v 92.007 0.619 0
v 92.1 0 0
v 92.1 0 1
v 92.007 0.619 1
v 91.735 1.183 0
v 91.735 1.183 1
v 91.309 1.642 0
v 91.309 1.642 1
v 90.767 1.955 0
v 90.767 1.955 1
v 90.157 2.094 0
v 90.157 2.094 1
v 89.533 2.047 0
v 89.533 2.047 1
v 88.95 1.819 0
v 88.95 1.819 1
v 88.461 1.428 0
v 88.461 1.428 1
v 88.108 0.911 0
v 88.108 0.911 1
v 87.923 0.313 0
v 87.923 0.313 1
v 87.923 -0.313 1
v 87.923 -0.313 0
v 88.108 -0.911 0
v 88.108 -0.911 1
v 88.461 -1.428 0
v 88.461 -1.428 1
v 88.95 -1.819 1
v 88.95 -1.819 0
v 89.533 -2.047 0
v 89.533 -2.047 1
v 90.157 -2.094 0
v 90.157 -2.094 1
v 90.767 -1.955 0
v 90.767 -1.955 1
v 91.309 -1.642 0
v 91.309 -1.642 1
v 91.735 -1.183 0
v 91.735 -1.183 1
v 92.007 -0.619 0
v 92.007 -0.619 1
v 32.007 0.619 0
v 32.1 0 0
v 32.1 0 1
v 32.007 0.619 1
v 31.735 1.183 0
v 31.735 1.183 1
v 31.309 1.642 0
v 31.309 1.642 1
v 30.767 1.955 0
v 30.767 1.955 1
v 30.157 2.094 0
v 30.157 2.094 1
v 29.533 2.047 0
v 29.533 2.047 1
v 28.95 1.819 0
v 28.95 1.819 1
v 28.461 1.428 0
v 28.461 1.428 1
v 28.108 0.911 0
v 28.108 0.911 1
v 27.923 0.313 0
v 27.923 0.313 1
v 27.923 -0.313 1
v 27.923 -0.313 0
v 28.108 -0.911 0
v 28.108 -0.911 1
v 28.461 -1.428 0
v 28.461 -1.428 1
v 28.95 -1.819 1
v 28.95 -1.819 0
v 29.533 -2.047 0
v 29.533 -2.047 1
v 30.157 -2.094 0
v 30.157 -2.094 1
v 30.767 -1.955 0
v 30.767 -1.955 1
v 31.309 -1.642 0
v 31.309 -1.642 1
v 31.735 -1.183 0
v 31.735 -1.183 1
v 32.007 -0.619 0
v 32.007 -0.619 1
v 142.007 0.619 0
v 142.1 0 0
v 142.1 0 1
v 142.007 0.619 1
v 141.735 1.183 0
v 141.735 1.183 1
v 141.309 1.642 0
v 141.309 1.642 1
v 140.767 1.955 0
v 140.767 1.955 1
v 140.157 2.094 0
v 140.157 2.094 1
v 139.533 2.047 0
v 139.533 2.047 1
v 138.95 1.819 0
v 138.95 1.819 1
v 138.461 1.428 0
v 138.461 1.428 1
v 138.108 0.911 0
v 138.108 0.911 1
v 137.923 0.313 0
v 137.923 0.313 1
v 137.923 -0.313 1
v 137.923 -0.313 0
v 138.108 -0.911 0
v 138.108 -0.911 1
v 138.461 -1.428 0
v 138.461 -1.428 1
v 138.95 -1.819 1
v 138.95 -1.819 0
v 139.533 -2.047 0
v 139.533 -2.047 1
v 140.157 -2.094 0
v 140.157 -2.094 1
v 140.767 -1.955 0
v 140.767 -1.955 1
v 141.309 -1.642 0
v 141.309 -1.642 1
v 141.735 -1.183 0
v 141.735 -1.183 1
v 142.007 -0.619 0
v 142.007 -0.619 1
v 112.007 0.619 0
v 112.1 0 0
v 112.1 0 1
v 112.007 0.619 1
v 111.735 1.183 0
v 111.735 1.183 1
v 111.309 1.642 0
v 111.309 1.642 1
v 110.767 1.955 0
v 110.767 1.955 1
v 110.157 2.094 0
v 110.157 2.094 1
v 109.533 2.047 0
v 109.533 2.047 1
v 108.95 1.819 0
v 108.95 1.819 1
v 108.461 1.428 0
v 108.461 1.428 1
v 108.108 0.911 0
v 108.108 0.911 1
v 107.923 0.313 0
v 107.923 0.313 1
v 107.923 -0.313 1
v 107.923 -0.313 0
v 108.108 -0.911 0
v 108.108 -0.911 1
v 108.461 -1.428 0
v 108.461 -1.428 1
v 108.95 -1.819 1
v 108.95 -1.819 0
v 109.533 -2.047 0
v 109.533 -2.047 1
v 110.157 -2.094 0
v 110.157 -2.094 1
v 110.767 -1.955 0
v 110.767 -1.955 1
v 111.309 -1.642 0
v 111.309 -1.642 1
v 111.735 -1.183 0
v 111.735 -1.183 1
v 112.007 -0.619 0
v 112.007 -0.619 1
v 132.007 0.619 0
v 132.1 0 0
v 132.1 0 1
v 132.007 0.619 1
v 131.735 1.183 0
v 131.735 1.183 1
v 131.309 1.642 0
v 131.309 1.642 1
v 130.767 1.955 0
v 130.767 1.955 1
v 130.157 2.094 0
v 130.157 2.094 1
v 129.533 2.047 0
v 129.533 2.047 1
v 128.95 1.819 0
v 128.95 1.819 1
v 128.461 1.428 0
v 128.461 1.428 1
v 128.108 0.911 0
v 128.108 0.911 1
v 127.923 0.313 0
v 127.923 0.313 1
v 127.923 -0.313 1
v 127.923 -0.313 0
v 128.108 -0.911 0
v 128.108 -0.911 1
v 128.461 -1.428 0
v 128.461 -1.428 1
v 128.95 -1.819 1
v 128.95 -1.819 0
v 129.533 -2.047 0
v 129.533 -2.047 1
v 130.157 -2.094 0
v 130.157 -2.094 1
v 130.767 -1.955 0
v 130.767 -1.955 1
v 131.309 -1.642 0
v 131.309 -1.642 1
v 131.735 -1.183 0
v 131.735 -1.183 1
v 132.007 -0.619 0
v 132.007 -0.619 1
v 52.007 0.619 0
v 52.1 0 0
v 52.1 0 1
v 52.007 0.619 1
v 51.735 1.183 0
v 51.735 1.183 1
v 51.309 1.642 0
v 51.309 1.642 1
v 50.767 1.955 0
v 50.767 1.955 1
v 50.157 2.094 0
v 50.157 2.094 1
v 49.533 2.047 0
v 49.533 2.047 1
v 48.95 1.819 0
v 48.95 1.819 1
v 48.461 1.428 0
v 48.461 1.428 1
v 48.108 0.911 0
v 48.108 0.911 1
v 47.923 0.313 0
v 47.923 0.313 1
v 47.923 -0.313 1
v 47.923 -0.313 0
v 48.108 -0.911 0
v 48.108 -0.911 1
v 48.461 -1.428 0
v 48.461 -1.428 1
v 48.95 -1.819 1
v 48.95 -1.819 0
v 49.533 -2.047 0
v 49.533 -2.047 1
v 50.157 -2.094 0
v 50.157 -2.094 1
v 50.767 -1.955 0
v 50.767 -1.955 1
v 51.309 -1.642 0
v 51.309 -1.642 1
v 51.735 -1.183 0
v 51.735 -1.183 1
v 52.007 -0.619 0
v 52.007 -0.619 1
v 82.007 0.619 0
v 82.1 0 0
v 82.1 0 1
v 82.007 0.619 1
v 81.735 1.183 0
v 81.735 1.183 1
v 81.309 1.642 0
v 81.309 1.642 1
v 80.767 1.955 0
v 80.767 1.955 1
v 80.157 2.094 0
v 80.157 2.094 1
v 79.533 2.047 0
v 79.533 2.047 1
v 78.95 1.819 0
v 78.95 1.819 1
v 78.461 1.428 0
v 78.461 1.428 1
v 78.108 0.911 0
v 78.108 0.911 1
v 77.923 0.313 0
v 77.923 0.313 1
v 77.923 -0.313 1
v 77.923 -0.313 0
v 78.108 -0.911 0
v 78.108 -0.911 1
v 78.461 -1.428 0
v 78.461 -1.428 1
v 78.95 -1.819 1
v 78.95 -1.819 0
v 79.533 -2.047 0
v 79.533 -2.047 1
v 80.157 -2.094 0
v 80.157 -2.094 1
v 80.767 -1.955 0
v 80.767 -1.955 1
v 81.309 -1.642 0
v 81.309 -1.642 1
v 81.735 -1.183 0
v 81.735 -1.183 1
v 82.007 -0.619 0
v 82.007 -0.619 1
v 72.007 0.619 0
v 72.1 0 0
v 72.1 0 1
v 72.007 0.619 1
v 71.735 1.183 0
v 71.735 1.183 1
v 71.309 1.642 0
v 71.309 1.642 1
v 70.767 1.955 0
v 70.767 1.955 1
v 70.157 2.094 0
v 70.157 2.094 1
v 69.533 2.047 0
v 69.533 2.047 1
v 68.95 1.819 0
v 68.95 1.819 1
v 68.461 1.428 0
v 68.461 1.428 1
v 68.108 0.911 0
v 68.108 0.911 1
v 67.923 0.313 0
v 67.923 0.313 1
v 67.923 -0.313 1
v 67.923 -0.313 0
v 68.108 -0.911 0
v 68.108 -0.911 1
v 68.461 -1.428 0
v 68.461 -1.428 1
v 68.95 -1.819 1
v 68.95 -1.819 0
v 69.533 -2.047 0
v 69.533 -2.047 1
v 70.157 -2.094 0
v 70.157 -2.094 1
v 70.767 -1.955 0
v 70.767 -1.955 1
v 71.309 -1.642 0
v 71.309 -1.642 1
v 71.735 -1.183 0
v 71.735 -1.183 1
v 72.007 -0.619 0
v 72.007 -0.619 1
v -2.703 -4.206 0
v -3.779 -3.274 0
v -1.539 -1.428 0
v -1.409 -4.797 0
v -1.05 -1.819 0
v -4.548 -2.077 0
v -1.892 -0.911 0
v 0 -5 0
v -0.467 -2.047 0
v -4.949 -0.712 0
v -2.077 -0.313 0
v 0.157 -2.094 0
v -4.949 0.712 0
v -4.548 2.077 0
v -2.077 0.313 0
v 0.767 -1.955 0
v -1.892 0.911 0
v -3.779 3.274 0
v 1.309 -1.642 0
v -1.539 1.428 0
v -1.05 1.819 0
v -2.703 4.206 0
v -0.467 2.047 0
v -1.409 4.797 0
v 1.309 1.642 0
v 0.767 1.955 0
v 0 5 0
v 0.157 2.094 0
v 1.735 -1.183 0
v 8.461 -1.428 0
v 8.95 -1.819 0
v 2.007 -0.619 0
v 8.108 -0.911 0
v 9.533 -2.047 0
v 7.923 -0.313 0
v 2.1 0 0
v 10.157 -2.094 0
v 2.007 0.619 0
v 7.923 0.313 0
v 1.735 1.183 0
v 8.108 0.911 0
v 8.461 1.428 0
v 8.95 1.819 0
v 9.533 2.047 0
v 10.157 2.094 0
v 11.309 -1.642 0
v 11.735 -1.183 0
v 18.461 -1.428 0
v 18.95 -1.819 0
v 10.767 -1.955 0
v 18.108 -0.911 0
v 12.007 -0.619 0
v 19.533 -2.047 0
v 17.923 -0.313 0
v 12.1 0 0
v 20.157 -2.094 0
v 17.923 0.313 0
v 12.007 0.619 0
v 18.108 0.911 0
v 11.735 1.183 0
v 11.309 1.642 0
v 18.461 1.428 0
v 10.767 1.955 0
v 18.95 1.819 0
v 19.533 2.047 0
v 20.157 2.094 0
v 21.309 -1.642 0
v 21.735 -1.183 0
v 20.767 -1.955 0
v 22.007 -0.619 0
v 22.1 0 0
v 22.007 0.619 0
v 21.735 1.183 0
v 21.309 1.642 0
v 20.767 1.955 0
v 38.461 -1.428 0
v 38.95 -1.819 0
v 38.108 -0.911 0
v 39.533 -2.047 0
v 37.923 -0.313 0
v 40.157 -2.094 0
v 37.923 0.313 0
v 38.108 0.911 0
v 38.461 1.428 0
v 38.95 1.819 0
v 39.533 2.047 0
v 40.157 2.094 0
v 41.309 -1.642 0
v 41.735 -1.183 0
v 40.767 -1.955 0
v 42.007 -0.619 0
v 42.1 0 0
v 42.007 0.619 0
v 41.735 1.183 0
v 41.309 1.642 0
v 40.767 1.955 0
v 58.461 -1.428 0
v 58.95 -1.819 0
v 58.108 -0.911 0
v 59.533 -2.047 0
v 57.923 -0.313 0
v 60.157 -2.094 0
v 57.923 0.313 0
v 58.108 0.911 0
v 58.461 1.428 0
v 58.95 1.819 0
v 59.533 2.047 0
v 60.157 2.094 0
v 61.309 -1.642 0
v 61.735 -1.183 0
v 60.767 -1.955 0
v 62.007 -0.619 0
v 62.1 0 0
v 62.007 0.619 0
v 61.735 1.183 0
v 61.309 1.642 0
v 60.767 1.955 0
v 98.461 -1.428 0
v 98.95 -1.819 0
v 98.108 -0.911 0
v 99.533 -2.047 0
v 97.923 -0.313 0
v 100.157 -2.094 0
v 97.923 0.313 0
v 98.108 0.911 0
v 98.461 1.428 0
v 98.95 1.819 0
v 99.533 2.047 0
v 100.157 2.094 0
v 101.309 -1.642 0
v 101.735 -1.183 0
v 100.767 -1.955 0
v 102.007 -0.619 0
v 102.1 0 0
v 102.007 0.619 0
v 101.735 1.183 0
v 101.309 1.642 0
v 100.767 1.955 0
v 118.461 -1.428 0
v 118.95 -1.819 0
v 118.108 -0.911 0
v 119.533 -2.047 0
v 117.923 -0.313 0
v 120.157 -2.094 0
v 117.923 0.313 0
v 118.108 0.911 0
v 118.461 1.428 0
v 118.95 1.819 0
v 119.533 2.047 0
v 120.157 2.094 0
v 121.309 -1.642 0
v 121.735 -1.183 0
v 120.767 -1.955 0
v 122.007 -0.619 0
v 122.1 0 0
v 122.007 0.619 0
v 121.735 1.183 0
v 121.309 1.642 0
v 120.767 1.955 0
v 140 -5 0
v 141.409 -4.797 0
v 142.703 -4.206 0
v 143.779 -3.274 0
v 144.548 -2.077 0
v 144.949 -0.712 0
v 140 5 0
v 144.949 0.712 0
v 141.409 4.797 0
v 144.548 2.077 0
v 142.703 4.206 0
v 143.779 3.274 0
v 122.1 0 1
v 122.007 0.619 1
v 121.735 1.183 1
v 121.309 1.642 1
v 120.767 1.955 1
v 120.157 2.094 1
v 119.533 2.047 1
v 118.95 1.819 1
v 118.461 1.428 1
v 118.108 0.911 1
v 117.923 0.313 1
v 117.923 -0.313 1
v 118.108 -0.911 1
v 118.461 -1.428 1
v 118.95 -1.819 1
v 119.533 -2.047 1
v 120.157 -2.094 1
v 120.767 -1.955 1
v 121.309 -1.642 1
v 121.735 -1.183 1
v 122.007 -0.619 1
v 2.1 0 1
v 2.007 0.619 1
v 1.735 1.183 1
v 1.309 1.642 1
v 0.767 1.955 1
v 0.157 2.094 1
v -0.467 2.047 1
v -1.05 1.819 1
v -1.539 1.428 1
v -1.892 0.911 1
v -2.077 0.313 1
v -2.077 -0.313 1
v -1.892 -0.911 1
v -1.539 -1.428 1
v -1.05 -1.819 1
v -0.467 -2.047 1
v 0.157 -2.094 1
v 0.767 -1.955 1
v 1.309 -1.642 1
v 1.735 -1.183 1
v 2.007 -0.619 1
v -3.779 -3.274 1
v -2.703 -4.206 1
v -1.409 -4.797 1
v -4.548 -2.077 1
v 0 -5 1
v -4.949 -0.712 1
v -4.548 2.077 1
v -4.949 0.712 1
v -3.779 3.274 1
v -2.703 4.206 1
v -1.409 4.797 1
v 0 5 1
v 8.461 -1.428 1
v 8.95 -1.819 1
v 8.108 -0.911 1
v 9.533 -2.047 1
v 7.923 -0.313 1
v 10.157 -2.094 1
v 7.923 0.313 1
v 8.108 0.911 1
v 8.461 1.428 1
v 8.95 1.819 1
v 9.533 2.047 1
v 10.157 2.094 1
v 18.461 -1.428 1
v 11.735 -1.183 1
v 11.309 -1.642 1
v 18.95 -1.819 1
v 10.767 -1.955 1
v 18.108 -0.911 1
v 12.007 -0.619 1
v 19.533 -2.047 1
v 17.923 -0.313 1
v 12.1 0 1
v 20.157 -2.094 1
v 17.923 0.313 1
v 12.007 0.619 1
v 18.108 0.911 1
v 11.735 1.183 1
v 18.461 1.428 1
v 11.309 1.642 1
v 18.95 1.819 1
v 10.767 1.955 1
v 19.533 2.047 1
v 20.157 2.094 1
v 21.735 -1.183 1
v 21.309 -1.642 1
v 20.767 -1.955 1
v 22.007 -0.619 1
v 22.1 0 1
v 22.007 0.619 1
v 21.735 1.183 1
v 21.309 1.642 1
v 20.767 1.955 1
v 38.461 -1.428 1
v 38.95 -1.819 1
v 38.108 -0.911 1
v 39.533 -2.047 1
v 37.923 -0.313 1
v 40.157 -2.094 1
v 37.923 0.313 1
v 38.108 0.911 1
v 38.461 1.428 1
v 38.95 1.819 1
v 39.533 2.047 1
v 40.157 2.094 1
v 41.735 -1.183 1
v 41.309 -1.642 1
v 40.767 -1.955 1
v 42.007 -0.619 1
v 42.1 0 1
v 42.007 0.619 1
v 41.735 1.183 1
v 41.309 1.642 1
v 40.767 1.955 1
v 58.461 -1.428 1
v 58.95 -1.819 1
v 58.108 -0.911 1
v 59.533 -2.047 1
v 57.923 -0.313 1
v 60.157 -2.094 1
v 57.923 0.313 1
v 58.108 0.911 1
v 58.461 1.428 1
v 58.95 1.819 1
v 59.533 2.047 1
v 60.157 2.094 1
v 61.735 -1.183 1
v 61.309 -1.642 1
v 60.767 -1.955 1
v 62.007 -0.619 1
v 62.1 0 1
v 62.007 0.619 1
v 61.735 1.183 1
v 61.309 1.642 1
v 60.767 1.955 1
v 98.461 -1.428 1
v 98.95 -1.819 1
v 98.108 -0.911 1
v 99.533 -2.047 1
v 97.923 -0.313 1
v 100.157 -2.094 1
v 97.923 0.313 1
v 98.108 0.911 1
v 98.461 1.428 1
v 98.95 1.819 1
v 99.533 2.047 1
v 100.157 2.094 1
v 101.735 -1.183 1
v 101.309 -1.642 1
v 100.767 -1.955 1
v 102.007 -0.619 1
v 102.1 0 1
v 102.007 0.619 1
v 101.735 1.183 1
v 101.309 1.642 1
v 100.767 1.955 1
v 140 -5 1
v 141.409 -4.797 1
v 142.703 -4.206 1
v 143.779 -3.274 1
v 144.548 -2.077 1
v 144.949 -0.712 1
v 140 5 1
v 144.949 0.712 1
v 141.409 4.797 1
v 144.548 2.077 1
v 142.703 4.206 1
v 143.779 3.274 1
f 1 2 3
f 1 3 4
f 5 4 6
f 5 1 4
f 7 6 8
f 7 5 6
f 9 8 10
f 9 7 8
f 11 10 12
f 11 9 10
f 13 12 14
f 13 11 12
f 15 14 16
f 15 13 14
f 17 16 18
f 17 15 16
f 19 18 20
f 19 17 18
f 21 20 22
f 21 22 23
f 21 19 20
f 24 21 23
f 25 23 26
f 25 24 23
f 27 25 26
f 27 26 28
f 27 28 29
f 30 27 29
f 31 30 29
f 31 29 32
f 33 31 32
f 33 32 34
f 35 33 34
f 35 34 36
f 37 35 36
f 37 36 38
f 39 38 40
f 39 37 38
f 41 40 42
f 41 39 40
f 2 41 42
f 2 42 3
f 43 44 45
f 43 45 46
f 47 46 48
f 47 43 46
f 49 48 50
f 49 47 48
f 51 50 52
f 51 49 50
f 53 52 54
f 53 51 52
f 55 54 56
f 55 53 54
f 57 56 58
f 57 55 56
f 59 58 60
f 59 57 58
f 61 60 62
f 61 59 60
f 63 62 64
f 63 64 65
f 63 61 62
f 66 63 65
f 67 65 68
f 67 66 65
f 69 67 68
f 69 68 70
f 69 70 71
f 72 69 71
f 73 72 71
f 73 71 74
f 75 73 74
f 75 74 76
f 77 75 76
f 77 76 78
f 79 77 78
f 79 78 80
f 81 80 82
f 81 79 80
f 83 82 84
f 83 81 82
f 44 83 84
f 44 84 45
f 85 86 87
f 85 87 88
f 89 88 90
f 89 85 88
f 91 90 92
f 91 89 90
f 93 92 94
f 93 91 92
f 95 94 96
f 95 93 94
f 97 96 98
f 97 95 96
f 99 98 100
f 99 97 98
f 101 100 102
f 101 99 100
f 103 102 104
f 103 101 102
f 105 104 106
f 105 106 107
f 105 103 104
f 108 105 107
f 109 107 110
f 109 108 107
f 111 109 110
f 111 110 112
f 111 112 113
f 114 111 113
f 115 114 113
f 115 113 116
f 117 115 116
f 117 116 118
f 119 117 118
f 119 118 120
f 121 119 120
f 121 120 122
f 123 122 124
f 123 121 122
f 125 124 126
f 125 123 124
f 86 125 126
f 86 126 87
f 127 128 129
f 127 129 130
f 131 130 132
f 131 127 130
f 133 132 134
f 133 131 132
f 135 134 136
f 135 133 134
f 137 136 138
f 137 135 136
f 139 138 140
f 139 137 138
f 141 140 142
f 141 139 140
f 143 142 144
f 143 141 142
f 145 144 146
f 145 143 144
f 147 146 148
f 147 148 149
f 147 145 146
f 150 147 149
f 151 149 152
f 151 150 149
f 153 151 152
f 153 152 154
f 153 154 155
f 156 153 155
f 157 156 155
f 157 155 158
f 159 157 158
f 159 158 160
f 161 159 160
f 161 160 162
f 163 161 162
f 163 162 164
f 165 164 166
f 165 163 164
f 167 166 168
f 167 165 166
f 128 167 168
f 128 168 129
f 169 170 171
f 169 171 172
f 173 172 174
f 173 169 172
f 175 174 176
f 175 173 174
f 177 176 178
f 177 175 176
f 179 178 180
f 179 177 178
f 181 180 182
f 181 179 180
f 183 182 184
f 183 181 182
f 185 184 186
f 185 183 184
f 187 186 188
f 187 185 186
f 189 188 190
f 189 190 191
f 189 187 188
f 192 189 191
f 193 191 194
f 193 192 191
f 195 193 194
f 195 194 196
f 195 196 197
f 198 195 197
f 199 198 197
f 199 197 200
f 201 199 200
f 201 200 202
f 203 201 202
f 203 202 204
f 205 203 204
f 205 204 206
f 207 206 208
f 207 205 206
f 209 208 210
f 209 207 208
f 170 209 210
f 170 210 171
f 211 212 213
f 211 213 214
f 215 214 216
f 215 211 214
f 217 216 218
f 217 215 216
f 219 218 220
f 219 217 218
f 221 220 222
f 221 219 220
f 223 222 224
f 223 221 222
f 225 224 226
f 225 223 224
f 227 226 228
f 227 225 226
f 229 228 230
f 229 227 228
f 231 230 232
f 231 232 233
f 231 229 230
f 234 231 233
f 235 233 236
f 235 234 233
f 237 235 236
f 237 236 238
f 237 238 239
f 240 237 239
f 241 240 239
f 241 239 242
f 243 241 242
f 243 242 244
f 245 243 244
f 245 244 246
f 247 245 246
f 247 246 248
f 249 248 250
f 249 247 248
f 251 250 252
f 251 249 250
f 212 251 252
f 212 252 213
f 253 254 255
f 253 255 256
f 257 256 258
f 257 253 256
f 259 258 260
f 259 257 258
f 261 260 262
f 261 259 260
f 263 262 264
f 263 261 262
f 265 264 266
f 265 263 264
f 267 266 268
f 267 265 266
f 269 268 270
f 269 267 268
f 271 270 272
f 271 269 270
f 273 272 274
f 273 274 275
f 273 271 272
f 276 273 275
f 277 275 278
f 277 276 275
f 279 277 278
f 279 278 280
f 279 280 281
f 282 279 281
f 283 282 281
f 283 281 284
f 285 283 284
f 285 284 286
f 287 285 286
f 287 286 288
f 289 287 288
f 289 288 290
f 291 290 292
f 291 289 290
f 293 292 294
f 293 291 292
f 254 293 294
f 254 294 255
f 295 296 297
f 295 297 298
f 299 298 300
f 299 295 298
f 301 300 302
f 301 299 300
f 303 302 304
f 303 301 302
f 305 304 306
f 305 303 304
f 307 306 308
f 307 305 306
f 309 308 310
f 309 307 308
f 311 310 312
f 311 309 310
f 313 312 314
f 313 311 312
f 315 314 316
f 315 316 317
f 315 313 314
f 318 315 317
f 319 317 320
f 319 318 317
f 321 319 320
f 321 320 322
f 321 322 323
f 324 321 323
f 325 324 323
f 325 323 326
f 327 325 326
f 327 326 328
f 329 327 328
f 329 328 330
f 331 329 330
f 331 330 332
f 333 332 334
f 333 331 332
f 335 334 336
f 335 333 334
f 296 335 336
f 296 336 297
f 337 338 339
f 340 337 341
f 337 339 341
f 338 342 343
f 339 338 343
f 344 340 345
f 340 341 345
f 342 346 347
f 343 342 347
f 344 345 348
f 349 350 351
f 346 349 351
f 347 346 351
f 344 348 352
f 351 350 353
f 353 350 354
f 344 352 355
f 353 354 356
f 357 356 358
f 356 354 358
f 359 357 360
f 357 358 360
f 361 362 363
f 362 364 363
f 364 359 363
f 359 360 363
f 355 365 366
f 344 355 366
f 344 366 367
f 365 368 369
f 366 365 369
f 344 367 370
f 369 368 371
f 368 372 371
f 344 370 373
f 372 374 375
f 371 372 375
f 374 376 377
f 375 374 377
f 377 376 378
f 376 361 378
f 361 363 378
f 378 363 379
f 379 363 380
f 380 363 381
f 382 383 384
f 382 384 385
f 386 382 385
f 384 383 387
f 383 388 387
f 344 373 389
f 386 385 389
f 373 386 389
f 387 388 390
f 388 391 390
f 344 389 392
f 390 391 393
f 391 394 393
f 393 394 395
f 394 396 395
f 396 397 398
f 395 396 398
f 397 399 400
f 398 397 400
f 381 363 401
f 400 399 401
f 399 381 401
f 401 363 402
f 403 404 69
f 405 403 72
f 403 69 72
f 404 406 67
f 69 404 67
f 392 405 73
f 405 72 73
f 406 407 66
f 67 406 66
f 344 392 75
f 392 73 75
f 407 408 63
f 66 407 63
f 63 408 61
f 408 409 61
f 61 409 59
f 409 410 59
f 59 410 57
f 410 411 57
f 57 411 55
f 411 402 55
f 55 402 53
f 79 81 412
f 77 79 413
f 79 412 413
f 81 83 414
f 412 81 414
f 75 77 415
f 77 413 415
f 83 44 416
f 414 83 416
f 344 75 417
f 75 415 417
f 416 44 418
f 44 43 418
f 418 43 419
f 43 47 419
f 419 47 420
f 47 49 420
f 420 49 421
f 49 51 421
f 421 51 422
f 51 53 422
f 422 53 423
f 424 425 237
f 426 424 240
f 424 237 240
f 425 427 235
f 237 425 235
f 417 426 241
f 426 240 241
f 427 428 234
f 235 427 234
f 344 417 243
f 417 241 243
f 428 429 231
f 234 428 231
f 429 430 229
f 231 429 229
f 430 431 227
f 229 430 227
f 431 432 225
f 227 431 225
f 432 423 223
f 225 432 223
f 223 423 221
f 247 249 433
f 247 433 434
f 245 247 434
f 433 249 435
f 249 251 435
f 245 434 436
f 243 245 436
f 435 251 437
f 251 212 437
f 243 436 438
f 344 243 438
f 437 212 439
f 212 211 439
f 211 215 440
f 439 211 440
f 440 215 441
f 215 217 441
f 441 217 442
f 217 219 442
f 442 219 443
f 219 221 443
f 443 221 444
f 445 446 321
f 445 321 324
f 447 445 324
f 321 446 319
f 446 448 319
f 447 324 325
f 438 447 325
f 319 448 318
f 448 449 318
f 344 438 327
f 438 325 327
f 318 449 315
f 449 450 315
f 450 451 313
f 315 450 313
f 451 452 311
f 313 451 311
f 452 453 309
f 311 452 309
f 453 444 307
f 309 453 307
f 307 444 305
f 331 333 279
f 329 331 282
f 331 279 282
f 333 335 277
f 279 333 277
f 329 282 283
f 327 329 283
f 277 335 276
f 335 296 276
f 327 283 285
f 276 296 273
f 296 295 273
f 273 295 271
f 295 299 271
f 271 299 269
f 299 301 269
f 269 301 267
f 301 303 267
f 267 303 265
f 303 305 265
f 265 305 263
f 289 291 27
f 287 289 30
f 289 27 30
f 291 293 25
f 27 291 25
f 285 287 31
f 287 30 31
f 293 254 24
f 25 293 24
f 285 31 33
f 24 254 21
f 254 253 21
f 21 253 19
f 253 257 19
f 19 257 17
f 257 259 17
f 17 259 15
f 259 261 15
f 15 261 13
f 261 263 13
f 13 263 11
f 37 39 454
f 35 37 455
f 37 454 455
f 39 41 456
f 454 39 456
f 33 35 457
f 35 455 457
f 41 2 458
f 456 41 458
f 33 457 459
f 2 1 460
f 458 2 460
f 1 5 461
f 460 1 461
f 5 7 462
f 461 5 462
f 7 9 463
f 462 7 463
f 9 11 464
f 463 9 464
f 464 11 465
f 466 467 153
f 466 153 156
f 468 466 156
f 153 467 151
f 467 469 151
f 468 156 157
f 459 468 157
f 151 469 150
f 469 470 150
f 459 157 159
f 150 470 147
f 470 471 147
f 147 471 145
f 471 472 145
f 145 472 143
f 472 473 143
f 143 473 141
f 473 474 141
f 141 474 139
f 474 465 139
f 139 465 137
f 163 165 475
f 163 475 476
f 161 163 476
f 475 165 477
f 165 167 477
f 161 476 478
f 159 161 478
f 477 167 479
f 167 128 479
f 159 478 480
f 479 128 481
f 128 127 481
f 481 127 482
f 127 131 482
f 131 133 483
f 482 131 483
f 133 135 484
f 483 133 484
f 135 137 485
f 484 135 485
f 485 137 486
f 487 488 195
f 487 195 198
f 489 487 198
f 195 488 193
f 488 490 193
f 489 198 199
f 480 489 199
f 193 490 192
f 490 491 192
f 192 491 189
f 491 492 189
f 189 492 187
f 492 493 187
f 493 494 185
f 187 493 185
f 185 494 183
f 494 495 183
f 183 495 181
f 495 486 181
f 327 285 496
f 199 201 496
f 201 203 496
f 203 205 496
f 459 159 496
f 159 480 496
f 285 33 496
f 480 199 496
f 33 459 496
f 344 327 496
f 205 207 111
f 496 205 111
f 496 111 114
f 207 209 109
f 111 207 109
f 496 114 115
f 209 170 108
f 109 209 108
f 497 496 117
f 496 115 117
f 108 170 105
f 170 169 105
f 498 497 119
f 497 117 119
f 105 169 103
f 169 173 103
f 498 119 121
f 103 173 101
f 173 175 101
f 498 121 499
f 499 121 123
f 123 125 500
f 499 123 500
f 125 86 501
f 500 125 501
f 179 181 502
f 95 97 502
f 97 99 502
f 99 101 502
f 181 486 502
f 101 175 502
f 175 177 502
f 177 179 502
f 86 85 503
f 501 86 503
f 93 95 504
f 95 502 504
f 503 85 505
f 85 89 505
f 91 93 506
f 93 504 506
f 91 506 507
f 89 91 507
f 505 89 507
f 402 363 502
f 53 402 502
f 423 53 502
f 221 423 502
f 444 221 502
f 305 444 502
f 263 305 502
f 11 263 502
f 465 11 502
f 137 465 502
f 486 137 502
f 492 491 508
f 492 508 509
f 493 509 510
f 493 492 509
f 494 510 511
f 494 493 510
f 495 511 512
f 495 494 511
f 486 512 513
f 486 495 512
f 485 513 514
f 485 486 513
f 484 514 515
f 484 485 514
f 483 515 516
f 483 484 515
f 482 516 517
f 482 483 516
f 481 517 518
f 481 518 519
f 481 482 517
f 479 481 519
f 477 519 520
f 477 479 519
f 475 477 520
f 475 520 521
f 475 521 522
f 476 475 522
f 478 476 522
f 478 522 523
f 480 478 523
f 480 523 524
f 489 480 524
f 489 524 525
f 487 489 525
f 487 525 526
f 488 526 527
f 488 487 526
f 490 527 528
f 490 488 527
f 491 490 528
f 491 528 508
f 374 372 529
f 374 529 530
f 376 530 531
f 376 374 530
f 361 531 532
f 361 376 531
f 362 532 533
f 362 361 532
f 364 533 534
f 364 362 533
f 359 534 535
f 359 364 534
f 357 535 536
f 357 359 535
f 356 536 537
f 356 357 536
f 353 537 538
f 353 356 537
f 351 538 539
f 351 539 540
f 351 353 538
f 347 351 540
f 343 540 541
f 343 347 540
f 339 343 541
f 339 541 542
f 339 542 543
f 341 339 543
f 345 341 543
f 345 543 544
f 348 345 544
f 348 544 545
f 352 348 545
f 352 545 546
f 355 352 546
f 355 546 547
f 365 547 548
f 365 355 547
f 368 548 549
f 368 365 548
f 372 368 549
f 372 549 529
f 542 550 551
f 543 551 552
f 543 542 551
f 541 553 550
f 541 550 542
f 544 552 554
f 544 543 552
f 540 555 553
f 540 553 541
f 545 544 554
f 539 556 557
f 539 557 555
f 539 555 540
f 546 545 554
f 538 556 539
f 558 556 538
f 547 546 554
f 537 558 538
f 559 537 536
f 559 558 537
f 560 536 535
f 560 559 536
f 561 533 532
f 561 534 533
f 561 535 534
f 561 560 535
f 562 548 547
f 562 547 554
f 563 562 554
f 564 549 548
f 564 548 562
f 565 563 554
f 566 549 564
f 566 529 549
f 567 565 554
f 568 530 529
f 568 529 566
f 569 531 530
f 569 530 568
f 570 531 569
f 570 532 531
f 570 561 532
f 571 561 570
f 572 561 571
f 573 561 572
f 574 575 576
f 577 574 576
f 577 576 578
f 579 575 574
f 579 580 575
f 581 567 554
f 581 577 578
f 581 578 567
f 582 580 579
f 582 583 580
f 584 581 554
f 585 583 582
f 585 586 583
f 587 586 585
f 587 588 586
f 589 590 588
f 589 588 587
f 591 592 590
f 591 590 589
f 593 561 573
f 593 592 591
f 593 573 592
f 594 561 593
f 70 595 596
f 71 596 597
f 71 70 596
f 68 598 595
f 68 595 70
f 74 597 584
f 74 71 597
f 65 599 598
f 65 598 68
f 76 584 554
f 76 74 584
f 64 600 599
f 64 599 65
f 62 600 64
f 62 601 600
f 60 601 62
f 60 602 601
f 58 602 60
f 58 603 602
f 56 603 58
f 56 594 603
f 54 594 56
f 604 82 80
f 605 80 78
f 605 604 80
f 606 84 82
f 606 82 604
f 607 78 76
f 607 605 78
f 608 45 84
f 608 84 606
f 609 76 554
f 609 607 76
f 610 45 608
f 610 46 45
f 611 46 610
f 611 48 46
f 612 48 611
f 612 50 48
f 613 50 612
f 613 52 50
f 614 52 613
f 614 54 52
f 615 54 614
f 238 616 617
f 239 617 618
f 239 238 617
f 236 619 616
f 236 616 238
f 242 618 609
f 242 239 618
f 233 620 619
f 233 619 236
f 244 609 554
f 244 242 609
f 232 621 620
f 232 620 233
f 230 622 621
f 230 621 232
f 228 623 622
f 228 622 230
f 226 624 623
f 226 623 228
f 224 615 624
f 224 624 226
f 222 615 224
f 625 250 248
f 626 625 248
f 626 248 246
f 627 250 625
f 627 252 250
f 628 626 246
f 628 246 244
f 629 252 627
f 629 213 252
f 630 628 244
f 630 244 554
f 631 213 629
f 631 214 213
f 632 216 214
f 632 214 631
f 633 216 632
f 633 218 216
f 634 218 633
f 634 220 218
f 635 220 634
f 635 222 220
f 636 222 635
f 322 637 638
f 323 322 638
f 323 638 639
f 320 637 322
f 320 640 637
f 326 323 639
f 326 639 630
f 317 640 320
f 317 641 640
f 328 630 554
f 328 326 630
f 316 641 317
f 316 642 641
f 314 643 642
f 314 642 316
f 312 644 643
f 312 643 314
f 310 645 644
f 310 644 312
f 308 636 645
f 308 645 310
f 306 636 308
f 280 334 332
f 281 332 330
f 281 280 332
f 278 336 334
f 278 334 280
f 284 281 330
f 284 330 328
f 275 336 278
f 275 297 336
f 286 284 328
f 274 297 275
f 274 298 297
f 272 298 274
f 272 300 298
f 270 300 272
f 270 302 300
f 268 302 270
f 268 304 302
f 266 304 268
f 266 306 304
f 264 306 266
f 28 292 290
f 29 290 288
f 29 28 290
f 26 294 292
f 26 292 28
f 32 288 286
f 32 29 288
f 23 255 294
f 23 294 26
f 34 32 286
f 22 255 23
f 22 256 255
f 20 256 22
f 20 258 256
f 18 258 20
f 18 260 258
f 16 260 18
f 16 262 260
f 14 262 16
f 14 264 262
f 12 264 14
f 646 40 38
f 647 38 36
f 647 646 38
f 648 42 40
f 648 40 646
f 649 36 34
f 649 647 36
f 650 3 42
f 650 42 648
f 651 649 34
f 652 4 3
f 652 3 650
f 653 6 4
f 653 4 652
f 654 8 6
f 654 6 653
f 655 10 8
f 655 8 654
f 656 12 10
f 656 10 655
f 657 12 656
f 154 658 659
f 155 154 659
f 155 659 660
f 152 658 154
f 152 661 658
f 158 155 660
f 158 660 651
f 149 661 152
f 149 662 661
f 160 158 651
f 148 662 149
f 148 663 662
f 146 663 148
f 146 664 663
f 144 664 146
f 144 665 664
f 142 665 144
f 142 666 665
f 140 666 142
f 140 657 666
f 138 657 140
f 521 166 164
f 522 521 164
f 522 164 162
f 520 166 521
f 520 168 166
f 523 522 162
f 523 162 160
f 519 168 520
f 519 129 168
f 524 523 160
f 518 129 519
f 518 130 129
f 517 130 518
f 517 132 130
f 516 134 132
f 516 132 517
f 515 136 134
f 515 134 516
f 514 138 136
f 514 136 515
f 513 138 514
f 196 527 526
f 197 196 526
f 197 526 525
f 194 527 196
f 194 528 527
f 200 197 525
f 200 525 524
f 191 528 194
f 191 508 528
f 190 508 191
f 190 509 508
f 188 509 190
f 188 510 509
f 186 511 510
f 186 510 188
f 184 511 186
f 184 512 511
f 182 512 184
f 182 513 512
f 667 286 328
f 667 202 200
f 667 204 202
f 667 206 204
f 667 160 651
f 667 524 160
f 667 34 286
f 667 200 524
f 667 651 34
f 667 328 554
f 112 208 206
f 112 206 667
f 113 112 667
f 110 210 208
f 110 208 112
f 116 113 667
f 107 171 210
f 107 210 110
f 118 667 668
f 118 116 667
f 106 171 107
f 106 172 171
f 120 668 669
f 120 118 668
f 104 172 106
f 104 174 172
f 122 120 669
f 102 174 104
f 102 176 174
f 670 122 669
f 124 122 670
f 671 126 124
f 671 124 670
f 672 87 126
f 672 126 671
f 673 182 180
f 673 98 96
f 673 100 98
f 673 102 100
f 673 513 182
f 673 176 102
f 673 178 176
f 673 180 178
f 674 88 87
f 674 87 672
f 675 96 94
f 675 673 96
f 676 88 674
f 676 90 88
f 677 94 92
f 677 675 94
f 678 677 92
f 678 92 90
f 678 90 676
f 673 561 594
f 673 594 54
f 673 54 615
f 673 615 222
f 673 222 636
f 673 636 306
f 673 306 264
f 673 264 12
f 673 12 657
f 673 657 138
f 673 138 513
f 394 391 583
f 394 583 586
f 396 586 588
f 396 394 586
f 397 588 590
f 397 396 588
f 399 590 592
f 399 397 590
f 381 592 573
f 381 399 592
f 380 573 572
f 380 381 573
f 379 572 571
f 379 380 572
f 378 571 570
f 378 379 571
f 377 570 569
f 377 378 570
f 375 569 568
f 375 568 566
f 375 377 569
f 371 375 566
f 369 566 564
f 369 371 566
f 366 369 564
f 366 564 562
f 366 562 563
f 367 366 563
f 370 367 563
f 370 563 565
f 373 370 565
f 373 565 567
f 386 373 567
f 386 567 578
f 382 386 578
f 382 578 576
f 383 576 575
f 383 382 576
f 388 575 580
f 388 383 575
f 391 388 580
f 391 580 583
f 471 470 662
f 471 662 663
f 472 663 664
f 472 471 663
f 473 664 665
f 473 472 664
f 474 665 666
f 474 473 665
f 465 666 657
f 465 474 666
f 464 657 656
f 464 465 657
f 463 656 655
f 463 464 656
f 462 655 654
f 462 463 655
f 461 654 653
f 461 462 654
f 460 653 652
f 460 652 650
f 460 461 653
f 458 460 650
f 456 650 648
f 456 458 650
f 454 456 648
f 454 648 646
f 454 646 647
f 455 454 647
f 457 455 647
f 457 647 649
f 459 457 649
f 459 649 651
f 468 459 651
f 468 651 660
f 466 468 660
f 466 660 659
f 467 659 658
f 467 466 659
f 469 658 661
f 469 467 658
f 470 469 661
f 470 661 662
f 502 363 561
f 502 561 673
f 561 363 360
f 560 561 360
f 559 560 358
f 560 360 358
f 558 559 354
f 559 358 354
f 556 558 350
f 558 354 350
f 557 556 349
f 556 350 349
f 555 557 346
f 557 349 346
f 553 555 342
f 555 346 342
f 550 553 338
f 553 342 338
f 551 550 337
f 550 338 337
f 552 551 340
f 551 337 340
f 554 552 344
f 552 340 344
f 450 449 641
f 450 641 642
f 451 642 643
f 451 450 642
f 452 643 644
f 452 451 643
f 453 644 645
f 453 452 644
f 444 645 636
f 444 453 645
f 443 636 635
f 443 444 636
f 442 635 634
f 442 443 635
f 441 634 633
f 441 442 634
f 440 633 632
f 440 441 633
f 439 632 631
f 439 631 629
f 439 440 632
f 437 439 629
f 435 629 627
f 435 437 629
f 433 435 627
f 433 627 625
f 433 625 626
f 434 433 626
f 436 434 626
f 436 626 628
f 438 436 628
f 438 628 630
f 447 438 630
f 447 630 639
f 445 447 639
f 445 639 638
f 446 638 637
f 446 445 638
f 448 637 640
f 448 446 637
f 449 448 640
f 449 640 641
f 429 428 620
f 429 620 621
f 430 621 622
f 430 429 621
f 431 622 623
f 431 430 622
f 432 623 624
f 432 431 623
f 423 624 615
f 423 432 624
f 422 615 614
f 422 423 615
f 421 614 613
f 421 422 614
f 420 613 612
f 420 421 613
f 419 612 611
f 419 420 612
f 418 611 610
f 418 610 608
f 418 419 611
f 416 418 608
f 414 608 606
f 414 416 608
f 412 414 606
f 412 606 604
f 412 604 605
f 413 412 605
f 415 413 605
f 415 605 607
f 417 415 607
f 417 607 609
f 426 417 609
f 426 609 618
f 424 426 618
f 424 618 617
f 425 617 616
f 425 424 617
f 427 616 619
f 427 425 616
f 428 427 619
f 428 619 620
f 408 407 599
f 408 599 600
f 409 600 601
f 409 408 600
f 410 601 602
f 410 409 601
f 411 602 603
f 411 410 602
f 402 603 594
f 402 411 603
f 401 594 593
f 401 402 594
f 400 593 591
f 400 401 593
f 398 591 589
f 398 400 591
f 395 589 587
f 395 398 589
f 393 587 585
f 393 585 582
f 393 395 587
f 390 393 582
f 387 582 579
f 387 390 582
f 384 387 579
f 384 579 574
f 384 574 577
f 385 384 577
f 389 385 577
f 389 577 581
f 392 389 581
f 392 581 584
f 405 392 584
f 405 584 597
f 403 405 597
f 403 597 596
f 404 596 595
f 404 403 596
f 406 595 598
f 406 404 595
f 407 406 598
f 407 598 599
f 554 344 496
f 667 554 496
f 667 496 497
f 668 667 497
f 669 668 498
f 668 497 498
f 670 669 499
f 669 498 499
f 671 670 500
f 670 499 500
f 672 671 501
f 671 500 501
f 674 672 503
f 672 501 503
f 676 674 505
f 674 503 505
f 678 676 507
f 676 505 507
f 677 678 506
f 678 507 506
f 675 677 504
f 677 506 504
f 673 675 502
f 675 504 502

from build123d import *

# Parameters (mm, degrees)
SKETCH_R  = 2.1
PAD_DEPTH = 1


with BuildPart() as part:
    # Sketch → Pad (new body)
    with BuildSketch(Plane.XY):
        with BuildLine():
            ThreePointArc((0, 5), (-5, 0), (0, -5))
            Line((0, -5), (140, -5))
            ThreePointArc((140, -5), (145, 0), (140, 5))
            Line((0, 5), (140, 5))
        make_face()
        Circle(SKETCH_R, mode=Mode.SUBTRACT)
        with Locations((10, 0)):
            Circle(SKETCH_R, mode=Mode.SUBTRACT)
        with Locations((20, 0)):
            Circle(SKETCH_R, mode=Mode.SUBTRACT)
        with Locations((30, 0)):
            Circle(SKETCH_R, mode=Mode.SUBTRACT)
        with Locations((40, 0)):
            Circle(SKETCH_R, mode=Mode.SUBTRACT)
        with Locations((50, 0)):
            Circle(SKETCH_R, mode=Mode.SUBTRACT)
        with Locations((60, 0)):
            Circle(SKETCH_R, mode=Mode.SUBTRACT)
        with Locations((70, 0)):
            Circle(SKETCH_R, mode=Mode.SUBTRACT)
        with Locations((80, 0)):
            Circle(SKETCH_R, mode=Mode.SUBTRACT)
        with Locations((90, 0)):
            Circle(SKETCH_R, mode=Mode.SUBTRACT)
        with Locations((100, 0)):
            Circle(SKETCH_R, mode=Mode.SUBTRACT)
        with Locations((110, 0)):
            Circle(SKETCH_R, mode=Mode.SUBTRACT)
        with Locations((120, 0)):
            Circle(SKETCH_R, mode=Mode.SUBTRACT)
        with Locations((130, 0)):
            Circle(SKETCH_R, mode=Mode.SUBTRACT)
        with Locations((140, 0)):
            Circle(SKETCH_R, mode=Mode.SUBTRACT)
    extrude(amount=PAD_DEPTH)


solid = part.part
